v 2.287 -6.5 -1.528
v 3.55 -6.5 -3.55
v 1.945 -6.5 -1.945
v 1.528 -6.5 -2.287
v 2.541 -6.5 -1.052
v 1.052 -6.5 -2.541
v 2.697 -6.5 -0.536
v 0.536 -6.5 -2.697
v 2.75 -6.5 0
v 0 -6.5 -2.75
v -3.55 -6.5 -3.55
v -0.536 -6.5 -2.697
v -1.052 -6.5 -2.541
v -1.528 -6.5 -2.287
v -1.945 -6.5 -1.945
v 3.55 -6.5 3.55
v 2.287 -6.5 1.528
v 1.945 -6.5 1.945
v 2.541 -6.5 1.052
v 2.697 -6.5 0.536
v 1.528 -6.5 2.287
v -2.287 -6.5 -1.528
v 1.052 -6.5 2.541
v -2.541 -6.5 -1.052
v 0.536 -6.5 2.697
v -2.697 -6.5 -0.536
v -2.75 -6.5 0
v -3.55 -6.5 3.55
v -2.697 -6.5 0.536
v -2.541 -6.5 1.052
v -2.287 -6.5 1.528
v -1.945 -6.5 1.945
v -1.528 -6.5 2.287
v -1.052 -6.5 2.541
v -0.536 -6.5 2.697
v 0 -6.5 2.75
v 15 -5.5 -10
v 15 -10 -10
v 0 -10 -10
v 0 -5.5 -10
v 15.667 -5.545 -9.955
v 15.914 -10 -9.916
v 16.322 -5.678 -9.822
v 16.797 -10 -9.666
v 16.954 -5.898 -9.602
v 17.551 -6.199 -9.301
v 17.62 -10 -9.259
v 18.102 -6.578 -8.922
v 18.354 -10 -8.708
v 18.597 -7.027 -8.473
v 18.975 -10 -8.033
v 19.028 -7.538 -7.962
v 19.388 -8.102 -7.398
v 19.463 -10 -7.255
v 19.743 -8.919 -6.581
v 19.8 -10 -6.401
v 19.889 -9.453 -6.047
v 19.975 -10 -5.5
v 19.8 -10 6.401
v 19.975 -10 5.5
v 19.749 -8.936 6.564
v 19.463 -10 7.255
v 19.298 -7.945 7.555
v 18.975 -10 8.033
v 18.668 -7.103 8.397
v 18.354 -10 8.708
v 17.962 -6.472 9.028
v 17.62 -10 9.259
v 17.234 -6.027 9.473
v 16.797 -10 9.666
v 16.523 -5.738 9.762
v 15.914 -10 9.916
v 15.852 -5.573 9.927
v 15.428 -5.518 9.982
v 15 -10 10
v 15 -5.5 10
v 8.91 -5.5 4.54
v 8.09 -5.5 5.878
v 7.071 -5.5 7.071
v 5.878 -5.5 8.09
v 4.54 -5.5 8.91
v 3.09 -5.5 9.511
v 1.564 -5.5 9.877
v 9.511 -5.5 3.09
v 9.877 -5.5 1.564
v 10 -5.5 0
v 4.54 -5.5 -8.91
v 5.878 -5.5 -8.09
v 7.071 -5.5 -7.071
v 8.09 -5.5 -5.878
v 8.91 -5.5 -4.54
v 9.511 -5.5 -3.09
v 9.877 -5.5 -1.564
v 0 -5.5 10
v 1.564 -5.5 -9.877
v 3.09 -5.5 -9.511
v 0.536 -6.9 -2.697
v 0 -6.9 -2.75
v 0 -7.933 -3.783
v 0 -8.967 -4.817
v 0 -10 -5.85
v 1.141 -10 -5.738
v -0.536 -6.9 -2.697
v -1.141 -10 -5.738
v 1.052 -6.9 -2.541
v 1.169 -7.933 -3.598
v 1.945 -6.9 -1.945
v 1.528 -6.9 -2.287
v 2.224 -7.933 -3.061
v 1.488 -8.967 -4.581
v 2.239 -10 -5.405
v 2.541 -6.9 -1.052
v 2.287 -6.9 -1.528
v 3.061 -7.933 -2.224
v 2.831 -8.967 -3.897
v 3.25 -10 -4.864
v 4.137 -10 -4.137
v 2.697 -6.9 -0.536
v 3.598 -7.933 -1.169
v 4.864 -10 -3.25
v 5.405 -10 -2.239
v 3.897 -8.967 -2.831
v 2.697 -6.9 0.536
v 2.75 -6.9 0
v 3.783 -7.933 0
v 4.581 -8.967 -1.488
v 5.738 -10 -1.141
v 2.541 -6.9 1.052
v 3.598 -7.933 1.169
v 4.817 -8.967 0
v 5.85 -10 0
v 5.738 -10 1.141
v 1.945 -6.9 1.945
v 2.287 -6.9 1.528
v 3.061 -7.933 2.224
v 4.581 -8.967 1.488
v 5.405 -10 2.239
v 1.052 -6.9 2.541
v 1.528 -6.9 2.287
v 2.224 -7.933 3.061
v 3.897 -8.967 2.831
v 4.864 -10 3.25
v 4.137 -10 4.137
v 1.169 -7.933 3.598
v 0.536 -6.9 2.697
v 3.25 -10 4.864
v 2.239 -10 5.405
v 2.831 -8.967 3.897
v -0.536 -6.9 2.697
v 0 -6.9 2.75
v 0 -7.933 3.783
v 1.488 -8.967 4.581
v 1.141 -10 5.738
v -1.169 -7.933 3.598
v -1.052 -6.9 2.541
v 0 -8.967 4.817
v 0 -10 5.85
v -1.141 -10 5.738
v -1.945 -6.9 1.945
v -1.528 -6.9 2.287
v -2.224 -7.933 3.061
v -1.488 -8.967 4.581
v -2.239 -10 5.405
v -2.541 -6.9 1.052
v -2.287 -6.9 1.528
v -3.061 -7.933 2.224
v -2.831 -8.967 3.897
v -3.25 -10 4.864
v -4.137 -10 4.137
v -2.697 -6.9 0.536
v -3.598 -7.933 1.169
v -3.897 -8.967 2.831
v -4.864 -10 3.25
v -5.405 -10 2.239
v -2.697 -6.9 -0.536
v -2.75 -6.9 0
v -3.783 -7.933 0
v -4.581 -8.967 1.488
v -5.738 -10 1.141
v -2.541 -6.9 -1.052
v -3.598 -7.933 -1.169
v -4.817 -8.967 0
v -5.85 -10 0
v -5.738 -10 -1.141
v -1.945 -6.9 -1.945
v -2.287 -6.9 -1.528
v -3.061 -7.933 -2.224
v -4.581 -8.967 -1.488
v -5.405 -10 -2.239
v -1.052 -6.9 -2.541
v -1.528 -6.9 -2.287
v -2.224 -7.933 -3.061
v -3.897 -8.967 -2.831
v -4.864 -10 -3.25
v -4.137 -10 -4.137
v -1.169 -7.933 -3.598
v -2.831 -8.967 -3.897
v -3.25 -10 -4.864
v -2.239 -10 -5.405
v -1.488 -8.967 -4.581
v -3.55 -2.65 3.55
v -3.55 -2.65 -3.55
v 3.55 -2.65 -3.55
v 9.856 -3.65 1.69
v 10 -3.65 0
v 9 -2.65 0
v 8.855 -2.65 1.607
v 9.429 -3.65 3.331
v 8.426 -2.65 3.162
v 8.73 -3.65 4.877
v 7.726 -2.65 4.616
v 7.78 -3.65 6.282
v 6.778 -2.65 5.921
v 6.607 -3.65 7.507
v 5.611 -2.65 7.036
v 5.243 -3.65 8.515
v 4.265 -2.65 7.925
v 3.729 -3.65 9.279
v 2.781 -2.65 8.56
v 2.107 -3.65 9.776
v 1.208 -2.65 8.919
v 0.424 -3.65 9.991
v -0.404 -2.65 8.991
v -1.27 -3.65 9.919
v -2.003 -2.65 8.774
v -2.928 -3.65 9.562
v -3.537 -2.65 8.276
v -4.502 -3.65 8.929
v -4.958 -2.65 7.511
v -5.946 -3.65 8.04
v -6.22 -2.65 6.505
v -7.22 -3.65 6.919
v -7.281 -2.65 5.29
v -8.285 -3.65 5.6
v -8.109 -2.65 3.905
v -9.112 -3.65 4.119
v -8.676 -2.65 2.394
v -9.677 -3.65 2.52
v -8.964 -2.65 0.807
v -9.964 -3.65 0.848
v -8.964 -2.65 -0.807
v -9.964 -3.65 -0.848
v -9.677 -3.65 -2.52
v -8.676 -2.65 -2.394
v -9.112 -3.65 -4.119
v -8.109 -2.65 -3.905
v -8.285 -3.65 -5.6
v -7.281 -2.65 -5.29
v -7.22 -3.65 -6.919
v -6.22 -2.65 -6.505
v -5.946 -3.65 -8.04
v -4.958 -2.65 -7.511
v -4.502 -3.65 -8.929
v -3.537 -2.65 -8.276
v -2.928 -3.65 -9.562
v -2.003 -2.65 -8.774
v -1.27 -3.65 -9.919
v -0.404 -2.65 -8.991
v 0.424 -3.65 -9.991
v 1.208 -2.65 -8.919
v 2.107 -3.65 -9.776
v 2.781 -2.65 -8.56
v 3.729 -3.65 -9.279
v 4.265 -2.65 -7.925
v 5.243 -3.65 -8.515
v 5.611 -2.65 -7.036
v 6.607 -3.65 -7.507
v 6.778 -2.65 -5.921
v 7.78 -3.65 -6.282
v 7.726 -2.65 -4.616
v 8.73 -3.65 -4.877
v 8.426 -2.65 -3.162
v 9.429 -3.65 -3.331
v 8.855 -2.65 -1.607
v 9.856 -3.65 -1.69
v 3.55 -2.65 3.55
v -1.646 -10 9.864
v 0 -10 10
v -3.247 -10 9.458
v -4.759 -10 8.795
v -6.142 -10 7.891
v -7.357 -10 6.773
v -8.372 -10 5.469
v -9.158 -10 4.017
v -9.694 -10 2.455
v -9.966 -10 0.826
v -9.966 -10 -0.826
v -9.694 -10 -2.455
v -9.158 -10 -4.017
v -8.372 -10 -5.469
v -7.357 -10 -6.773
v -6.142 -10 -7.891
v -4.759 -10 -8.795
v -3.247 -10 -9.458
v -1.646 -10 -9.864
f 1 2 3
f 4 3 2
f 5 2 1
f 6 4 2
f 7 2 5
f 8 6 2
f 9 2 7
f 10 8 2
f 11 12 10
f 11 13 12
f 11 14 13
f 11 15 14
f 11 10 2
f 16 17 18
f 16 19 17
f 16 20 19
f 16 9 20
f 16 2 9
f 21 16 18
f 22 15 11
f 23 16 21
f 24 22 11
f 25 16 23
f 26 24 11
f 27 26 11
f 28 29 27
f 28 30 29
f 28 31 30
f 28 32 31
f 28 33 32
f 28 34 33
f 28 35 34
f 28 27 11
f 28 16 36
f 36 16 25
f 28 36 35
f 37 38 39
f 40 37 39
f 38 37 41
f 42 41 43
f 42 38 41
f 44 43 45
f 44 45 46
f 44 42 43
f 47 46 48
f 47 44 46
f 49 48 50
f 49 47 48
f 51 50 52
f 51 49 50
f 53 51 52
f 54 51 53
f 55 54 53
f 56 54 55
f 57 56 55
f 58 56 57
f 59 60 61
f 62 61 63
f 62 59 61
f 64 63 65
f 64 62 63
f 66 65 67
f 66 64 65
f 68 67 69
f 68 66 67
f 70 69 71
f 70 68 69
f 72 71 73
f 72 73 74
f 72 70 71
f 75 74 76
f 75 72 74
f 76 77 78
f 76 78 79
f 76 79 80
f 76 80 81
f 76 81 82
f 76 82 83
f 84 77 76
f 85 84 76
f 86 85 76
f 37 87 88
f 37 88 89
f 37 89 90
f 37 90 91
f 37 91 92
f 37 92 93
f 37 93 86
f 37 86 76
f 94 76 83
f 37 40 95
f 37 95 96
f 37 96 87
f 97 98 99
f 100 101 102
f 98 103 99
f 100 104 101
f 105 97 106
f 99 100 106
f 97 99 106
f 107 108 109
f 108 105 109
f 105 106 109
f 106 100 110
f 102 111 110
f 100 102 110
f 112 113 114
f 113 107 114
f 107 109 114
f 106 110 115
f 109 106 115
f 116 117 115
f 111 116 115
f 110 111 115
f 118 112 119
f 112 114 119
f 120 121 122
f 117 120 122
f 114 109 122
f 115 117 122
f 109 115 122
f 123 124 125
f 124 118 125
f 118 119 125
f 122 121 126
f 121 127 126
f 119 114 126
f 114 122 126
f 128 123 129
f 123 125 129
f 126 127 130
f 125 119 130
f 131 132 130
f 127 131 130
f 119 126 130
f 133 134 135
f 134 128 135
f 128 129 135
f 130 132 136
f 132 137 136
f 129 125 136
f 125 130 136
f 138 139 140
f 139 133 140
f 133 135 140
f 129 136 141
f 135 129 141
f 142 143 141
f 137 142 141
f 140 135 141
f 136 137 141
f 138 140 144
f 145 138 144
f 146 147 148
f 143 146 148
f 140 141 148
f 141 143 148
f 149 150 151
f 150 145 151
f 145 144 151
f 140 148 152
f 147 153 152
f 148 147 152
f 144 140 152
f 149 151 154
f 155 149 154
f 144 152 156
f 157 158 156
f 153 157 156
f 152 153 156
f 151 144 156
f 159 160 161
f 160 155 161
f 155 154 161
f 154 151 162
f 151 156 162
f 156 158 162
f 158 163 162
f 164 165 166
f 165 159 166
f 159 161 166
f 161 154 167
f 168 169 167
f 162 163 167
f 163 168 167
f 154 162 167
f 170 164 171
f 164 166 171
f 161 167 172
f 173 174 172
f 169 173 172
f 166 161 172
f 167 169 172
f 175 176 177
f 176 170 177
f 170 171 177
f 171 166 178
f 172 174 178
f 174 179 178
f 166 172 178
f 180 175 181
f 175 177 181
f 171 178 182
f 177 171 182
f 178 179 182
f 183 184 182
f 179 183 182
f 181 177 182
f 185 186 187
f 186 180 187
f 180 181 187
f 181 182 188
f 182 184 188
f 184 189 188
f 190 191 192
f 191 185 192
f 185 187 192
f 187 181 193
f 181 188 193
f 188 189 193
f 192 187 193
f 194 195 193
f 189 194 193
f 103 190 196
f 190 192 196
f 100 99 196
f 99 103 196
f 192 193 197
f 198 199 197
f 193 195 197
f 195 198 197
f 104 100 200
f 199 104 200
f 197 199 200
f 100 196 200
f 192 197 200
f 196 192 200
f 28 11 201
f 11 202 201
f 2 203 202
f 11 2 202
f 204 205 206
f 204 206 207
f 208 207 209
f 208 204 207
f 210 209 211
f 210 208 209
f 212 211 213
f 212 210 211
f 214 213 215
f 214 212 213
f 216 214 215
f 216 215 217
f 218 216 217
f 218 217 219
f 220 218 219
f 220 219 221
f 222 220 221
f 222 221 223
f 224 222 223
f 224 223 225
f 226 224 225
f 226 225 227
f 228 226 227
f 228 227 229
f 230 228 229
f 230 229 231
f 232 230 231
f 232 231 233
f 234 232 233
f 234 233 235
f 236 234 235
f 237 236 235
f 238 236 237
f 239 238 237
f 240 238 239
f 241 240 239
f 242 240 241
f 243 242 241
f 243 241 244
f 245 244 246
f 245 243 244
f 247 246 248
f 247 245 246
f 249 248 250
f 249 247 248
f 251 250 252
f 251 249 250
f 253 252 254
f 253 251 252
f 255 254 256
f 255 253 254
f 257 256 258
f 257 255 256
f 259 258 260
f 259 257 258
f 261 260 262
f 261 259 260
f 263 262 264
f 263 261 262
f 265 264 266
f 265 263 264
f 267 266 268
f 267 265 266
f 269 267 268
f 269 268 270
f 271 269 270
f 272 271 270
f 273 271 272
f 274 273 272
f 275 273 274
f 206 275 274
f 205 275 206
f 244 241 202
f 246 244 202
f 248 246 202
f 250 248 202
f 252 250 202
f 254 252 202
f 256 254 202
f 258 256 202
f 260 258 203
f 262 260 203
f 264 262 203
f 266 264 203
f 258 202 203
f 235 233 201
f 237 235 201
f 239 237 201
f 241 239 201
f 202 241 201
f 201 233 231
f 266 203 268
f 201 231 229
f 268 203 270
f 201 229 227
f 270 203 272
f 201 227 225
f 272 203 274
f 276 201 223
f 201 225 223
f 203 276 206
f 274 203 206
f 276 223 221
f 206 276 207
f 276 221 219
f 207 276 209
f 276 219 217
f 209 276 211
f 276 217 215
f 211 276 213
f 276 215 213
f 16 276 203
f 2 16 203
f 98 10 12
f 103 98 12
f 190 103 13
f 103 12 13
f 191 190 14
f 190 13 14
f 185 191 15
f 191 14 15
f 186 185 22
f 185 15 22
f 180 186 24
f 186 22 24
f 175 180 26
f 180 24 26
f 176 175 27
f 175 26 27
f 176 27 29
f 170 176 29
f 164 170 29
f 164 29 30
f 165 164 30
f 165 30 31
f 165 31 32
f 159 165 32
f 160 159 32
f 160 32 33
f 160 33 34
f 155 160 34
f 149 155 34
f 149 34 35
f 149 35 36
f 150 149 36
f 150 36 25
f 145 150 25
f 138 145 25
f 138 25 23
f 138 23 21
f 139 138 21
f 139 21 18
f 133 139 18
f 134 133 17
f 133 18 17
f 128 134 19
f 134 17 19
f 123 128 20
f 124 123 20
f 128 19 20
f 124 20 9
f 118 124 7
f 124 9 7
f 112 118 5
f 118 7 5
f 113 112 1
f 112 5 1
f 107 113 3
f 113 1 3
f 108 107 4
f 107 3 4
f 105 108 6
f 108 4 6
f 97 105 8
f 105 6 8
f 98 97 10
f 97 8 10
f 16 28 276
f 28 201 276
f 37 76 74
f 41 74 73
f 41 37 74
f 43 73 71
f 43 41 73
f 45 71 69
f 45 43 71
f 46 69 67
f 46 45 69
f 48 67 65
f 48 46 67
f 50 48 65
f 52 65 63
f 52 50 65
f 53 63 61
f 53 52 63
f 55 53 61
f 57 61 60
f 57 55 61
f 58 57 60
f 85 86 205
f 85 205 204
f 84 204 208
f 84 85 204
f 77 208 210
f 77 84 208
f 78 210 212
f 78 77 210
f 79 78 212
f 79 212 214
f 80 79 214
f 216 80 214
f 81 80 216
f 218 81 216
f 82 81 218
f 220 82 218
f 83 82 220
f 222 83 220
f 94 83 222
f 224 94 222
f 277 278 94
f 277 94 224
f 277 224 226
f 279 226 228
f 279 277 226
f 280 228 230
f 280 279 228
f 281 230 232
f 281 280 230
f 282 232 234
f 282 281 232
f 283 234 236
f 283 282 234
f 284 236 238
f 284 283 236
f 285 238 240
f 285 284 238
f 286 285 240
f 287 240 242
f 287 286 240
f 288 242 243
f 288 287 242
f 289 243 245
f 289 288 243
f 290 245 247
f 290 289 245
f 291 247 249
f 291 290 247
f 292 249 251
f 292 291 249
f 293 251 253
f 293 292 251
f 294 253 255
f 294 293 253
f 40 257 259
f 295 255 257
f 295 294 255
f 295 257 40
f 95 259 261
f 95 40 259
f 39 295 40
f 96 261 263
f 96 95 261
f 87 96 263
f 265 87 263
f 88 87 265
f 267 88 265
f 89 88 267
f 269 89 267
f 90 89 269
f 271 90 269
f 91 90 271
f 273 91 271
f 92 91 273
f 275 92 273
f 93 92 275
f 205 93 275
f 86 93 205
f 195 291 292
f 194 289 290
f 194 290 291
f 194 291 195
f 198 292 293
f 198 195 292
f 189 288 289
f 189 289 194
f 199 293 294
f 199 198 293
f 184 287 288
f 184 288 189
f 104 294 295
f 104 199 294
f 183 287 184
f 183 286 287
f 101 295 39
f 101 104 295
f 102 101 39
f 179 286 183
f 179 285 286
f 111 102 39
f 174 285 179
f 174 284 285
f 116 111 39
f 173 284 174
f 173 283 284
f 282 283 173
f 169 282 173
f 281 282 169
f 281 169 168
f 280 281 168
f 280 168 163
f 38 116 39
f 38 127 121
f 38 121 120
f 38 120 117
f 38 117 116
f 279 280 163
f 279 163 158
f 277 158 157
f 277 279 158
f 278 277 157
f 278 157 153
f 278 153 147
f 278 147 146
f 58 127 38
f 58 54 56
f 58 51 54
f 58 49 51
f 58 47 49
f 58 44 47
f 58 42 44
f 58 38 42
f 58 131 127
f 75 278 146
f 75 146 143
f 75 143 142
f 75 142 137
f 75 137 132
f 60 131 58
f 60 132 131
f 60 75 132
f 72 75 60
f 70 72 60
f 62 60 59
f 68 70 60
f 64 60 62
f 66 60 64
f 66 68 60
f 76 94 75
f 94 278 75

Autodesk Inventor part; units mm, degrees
sketch "Sketch_1" plane through (0, 0, 0) normal (0, 0, 1) x (1, 0, 0)
  line L0 (0, -10) -> (0, -2.65)
  line L1 (0, -2.65) -> (9, -2.65)
  line L2 (9, -2.65) -> (10, -3.65)
  line L3 (10, -3.65) -> (10, -10)
  line L4 (10, -10) -> (0, -10)
  line L5 (0, -10) -> (0, -2.65)
revolve "Revolution1" add sketch "Sketch_1" angle 360 about axis through (0, -10, 0) along (0, -1, 0)
sketch "Sketch_2" plane through (0, -10, 0) normal (0, 1, 0) x (1, 0, 0)
  line L0 (0, 10) -> (0, -10)
  line L1 (0, -10) -> (15, -10)
  arc A0 (15, -10) -> (20, -5) centre (15, -5) ccw
  line L2 (20, -5) -> (20, 5)
  arc A1 (20, 5) -> (15, 10) centre (15, 5) ccw
  line L3 (15, 10) -> (0, 10)
extrude "Extrusion1" add sketch "Sketch_2" along normal blind 4.5
sketch "Sketch3" plane through (0, -10, -10) normal (0, -1, 0) x (1, 0, 0)
  point P0 (0, 10)
hole "Hole1" at (0, -10, 0) direction (0, 1, 0) diameter 5.5 depth 3.5 countersink diameter 11.7 countersink angle 90
sketch "Sketch_9" plane through (0, 0, 0) normal (0, 1, 0) x (-1, 0, 0)
  line L0 (3.55, -3.55) -> (3.55, 3.55)
  line L1 (3.55, 3.55) -> (-3.55, 3.55)
  line L2 (-3.55, 3.55) -> (-3.55, -3.55)
  line L3 (-3.55, -3.55) -> (3.55, -3.55)
extrude "Extrusion2" cut sketch "Sketch_9" against normal blind 6.5
sketch "Sketch_3" plane through (0, 0, 0) normal (0, 0, 1) x (1, 0, 0)
  line L0 (15, -2) -> (15, -5.5)
  arc A0 (20, -10.5) -> (15, -5.5) centre (15, -10.5) ccw
  line L1 (20, -10.5) -> (25, -10.5)
  line L2 (25, -10.5) -> (25, -2)
  line L3 (25, -2) -> (15, -2)
extrude "Extrusion3" cut sketch "Sketch_3" along normal mid plane 20
ref_plane "bottom_to_ins_XY" through (0, 0, 0) normal (0, 1, 0) x (1, 0, 0)
ref_plane "bottom_to_ins_YZ" through (0, 0, 0) normal (1, 0, 0) x (0, 0, -1)
ref_plane "bottom_to_ins_ZX" through (0, 0, 0) normal (0, 0, -1) x (0, 1, 0)
properties part number "JBlock_plate"
